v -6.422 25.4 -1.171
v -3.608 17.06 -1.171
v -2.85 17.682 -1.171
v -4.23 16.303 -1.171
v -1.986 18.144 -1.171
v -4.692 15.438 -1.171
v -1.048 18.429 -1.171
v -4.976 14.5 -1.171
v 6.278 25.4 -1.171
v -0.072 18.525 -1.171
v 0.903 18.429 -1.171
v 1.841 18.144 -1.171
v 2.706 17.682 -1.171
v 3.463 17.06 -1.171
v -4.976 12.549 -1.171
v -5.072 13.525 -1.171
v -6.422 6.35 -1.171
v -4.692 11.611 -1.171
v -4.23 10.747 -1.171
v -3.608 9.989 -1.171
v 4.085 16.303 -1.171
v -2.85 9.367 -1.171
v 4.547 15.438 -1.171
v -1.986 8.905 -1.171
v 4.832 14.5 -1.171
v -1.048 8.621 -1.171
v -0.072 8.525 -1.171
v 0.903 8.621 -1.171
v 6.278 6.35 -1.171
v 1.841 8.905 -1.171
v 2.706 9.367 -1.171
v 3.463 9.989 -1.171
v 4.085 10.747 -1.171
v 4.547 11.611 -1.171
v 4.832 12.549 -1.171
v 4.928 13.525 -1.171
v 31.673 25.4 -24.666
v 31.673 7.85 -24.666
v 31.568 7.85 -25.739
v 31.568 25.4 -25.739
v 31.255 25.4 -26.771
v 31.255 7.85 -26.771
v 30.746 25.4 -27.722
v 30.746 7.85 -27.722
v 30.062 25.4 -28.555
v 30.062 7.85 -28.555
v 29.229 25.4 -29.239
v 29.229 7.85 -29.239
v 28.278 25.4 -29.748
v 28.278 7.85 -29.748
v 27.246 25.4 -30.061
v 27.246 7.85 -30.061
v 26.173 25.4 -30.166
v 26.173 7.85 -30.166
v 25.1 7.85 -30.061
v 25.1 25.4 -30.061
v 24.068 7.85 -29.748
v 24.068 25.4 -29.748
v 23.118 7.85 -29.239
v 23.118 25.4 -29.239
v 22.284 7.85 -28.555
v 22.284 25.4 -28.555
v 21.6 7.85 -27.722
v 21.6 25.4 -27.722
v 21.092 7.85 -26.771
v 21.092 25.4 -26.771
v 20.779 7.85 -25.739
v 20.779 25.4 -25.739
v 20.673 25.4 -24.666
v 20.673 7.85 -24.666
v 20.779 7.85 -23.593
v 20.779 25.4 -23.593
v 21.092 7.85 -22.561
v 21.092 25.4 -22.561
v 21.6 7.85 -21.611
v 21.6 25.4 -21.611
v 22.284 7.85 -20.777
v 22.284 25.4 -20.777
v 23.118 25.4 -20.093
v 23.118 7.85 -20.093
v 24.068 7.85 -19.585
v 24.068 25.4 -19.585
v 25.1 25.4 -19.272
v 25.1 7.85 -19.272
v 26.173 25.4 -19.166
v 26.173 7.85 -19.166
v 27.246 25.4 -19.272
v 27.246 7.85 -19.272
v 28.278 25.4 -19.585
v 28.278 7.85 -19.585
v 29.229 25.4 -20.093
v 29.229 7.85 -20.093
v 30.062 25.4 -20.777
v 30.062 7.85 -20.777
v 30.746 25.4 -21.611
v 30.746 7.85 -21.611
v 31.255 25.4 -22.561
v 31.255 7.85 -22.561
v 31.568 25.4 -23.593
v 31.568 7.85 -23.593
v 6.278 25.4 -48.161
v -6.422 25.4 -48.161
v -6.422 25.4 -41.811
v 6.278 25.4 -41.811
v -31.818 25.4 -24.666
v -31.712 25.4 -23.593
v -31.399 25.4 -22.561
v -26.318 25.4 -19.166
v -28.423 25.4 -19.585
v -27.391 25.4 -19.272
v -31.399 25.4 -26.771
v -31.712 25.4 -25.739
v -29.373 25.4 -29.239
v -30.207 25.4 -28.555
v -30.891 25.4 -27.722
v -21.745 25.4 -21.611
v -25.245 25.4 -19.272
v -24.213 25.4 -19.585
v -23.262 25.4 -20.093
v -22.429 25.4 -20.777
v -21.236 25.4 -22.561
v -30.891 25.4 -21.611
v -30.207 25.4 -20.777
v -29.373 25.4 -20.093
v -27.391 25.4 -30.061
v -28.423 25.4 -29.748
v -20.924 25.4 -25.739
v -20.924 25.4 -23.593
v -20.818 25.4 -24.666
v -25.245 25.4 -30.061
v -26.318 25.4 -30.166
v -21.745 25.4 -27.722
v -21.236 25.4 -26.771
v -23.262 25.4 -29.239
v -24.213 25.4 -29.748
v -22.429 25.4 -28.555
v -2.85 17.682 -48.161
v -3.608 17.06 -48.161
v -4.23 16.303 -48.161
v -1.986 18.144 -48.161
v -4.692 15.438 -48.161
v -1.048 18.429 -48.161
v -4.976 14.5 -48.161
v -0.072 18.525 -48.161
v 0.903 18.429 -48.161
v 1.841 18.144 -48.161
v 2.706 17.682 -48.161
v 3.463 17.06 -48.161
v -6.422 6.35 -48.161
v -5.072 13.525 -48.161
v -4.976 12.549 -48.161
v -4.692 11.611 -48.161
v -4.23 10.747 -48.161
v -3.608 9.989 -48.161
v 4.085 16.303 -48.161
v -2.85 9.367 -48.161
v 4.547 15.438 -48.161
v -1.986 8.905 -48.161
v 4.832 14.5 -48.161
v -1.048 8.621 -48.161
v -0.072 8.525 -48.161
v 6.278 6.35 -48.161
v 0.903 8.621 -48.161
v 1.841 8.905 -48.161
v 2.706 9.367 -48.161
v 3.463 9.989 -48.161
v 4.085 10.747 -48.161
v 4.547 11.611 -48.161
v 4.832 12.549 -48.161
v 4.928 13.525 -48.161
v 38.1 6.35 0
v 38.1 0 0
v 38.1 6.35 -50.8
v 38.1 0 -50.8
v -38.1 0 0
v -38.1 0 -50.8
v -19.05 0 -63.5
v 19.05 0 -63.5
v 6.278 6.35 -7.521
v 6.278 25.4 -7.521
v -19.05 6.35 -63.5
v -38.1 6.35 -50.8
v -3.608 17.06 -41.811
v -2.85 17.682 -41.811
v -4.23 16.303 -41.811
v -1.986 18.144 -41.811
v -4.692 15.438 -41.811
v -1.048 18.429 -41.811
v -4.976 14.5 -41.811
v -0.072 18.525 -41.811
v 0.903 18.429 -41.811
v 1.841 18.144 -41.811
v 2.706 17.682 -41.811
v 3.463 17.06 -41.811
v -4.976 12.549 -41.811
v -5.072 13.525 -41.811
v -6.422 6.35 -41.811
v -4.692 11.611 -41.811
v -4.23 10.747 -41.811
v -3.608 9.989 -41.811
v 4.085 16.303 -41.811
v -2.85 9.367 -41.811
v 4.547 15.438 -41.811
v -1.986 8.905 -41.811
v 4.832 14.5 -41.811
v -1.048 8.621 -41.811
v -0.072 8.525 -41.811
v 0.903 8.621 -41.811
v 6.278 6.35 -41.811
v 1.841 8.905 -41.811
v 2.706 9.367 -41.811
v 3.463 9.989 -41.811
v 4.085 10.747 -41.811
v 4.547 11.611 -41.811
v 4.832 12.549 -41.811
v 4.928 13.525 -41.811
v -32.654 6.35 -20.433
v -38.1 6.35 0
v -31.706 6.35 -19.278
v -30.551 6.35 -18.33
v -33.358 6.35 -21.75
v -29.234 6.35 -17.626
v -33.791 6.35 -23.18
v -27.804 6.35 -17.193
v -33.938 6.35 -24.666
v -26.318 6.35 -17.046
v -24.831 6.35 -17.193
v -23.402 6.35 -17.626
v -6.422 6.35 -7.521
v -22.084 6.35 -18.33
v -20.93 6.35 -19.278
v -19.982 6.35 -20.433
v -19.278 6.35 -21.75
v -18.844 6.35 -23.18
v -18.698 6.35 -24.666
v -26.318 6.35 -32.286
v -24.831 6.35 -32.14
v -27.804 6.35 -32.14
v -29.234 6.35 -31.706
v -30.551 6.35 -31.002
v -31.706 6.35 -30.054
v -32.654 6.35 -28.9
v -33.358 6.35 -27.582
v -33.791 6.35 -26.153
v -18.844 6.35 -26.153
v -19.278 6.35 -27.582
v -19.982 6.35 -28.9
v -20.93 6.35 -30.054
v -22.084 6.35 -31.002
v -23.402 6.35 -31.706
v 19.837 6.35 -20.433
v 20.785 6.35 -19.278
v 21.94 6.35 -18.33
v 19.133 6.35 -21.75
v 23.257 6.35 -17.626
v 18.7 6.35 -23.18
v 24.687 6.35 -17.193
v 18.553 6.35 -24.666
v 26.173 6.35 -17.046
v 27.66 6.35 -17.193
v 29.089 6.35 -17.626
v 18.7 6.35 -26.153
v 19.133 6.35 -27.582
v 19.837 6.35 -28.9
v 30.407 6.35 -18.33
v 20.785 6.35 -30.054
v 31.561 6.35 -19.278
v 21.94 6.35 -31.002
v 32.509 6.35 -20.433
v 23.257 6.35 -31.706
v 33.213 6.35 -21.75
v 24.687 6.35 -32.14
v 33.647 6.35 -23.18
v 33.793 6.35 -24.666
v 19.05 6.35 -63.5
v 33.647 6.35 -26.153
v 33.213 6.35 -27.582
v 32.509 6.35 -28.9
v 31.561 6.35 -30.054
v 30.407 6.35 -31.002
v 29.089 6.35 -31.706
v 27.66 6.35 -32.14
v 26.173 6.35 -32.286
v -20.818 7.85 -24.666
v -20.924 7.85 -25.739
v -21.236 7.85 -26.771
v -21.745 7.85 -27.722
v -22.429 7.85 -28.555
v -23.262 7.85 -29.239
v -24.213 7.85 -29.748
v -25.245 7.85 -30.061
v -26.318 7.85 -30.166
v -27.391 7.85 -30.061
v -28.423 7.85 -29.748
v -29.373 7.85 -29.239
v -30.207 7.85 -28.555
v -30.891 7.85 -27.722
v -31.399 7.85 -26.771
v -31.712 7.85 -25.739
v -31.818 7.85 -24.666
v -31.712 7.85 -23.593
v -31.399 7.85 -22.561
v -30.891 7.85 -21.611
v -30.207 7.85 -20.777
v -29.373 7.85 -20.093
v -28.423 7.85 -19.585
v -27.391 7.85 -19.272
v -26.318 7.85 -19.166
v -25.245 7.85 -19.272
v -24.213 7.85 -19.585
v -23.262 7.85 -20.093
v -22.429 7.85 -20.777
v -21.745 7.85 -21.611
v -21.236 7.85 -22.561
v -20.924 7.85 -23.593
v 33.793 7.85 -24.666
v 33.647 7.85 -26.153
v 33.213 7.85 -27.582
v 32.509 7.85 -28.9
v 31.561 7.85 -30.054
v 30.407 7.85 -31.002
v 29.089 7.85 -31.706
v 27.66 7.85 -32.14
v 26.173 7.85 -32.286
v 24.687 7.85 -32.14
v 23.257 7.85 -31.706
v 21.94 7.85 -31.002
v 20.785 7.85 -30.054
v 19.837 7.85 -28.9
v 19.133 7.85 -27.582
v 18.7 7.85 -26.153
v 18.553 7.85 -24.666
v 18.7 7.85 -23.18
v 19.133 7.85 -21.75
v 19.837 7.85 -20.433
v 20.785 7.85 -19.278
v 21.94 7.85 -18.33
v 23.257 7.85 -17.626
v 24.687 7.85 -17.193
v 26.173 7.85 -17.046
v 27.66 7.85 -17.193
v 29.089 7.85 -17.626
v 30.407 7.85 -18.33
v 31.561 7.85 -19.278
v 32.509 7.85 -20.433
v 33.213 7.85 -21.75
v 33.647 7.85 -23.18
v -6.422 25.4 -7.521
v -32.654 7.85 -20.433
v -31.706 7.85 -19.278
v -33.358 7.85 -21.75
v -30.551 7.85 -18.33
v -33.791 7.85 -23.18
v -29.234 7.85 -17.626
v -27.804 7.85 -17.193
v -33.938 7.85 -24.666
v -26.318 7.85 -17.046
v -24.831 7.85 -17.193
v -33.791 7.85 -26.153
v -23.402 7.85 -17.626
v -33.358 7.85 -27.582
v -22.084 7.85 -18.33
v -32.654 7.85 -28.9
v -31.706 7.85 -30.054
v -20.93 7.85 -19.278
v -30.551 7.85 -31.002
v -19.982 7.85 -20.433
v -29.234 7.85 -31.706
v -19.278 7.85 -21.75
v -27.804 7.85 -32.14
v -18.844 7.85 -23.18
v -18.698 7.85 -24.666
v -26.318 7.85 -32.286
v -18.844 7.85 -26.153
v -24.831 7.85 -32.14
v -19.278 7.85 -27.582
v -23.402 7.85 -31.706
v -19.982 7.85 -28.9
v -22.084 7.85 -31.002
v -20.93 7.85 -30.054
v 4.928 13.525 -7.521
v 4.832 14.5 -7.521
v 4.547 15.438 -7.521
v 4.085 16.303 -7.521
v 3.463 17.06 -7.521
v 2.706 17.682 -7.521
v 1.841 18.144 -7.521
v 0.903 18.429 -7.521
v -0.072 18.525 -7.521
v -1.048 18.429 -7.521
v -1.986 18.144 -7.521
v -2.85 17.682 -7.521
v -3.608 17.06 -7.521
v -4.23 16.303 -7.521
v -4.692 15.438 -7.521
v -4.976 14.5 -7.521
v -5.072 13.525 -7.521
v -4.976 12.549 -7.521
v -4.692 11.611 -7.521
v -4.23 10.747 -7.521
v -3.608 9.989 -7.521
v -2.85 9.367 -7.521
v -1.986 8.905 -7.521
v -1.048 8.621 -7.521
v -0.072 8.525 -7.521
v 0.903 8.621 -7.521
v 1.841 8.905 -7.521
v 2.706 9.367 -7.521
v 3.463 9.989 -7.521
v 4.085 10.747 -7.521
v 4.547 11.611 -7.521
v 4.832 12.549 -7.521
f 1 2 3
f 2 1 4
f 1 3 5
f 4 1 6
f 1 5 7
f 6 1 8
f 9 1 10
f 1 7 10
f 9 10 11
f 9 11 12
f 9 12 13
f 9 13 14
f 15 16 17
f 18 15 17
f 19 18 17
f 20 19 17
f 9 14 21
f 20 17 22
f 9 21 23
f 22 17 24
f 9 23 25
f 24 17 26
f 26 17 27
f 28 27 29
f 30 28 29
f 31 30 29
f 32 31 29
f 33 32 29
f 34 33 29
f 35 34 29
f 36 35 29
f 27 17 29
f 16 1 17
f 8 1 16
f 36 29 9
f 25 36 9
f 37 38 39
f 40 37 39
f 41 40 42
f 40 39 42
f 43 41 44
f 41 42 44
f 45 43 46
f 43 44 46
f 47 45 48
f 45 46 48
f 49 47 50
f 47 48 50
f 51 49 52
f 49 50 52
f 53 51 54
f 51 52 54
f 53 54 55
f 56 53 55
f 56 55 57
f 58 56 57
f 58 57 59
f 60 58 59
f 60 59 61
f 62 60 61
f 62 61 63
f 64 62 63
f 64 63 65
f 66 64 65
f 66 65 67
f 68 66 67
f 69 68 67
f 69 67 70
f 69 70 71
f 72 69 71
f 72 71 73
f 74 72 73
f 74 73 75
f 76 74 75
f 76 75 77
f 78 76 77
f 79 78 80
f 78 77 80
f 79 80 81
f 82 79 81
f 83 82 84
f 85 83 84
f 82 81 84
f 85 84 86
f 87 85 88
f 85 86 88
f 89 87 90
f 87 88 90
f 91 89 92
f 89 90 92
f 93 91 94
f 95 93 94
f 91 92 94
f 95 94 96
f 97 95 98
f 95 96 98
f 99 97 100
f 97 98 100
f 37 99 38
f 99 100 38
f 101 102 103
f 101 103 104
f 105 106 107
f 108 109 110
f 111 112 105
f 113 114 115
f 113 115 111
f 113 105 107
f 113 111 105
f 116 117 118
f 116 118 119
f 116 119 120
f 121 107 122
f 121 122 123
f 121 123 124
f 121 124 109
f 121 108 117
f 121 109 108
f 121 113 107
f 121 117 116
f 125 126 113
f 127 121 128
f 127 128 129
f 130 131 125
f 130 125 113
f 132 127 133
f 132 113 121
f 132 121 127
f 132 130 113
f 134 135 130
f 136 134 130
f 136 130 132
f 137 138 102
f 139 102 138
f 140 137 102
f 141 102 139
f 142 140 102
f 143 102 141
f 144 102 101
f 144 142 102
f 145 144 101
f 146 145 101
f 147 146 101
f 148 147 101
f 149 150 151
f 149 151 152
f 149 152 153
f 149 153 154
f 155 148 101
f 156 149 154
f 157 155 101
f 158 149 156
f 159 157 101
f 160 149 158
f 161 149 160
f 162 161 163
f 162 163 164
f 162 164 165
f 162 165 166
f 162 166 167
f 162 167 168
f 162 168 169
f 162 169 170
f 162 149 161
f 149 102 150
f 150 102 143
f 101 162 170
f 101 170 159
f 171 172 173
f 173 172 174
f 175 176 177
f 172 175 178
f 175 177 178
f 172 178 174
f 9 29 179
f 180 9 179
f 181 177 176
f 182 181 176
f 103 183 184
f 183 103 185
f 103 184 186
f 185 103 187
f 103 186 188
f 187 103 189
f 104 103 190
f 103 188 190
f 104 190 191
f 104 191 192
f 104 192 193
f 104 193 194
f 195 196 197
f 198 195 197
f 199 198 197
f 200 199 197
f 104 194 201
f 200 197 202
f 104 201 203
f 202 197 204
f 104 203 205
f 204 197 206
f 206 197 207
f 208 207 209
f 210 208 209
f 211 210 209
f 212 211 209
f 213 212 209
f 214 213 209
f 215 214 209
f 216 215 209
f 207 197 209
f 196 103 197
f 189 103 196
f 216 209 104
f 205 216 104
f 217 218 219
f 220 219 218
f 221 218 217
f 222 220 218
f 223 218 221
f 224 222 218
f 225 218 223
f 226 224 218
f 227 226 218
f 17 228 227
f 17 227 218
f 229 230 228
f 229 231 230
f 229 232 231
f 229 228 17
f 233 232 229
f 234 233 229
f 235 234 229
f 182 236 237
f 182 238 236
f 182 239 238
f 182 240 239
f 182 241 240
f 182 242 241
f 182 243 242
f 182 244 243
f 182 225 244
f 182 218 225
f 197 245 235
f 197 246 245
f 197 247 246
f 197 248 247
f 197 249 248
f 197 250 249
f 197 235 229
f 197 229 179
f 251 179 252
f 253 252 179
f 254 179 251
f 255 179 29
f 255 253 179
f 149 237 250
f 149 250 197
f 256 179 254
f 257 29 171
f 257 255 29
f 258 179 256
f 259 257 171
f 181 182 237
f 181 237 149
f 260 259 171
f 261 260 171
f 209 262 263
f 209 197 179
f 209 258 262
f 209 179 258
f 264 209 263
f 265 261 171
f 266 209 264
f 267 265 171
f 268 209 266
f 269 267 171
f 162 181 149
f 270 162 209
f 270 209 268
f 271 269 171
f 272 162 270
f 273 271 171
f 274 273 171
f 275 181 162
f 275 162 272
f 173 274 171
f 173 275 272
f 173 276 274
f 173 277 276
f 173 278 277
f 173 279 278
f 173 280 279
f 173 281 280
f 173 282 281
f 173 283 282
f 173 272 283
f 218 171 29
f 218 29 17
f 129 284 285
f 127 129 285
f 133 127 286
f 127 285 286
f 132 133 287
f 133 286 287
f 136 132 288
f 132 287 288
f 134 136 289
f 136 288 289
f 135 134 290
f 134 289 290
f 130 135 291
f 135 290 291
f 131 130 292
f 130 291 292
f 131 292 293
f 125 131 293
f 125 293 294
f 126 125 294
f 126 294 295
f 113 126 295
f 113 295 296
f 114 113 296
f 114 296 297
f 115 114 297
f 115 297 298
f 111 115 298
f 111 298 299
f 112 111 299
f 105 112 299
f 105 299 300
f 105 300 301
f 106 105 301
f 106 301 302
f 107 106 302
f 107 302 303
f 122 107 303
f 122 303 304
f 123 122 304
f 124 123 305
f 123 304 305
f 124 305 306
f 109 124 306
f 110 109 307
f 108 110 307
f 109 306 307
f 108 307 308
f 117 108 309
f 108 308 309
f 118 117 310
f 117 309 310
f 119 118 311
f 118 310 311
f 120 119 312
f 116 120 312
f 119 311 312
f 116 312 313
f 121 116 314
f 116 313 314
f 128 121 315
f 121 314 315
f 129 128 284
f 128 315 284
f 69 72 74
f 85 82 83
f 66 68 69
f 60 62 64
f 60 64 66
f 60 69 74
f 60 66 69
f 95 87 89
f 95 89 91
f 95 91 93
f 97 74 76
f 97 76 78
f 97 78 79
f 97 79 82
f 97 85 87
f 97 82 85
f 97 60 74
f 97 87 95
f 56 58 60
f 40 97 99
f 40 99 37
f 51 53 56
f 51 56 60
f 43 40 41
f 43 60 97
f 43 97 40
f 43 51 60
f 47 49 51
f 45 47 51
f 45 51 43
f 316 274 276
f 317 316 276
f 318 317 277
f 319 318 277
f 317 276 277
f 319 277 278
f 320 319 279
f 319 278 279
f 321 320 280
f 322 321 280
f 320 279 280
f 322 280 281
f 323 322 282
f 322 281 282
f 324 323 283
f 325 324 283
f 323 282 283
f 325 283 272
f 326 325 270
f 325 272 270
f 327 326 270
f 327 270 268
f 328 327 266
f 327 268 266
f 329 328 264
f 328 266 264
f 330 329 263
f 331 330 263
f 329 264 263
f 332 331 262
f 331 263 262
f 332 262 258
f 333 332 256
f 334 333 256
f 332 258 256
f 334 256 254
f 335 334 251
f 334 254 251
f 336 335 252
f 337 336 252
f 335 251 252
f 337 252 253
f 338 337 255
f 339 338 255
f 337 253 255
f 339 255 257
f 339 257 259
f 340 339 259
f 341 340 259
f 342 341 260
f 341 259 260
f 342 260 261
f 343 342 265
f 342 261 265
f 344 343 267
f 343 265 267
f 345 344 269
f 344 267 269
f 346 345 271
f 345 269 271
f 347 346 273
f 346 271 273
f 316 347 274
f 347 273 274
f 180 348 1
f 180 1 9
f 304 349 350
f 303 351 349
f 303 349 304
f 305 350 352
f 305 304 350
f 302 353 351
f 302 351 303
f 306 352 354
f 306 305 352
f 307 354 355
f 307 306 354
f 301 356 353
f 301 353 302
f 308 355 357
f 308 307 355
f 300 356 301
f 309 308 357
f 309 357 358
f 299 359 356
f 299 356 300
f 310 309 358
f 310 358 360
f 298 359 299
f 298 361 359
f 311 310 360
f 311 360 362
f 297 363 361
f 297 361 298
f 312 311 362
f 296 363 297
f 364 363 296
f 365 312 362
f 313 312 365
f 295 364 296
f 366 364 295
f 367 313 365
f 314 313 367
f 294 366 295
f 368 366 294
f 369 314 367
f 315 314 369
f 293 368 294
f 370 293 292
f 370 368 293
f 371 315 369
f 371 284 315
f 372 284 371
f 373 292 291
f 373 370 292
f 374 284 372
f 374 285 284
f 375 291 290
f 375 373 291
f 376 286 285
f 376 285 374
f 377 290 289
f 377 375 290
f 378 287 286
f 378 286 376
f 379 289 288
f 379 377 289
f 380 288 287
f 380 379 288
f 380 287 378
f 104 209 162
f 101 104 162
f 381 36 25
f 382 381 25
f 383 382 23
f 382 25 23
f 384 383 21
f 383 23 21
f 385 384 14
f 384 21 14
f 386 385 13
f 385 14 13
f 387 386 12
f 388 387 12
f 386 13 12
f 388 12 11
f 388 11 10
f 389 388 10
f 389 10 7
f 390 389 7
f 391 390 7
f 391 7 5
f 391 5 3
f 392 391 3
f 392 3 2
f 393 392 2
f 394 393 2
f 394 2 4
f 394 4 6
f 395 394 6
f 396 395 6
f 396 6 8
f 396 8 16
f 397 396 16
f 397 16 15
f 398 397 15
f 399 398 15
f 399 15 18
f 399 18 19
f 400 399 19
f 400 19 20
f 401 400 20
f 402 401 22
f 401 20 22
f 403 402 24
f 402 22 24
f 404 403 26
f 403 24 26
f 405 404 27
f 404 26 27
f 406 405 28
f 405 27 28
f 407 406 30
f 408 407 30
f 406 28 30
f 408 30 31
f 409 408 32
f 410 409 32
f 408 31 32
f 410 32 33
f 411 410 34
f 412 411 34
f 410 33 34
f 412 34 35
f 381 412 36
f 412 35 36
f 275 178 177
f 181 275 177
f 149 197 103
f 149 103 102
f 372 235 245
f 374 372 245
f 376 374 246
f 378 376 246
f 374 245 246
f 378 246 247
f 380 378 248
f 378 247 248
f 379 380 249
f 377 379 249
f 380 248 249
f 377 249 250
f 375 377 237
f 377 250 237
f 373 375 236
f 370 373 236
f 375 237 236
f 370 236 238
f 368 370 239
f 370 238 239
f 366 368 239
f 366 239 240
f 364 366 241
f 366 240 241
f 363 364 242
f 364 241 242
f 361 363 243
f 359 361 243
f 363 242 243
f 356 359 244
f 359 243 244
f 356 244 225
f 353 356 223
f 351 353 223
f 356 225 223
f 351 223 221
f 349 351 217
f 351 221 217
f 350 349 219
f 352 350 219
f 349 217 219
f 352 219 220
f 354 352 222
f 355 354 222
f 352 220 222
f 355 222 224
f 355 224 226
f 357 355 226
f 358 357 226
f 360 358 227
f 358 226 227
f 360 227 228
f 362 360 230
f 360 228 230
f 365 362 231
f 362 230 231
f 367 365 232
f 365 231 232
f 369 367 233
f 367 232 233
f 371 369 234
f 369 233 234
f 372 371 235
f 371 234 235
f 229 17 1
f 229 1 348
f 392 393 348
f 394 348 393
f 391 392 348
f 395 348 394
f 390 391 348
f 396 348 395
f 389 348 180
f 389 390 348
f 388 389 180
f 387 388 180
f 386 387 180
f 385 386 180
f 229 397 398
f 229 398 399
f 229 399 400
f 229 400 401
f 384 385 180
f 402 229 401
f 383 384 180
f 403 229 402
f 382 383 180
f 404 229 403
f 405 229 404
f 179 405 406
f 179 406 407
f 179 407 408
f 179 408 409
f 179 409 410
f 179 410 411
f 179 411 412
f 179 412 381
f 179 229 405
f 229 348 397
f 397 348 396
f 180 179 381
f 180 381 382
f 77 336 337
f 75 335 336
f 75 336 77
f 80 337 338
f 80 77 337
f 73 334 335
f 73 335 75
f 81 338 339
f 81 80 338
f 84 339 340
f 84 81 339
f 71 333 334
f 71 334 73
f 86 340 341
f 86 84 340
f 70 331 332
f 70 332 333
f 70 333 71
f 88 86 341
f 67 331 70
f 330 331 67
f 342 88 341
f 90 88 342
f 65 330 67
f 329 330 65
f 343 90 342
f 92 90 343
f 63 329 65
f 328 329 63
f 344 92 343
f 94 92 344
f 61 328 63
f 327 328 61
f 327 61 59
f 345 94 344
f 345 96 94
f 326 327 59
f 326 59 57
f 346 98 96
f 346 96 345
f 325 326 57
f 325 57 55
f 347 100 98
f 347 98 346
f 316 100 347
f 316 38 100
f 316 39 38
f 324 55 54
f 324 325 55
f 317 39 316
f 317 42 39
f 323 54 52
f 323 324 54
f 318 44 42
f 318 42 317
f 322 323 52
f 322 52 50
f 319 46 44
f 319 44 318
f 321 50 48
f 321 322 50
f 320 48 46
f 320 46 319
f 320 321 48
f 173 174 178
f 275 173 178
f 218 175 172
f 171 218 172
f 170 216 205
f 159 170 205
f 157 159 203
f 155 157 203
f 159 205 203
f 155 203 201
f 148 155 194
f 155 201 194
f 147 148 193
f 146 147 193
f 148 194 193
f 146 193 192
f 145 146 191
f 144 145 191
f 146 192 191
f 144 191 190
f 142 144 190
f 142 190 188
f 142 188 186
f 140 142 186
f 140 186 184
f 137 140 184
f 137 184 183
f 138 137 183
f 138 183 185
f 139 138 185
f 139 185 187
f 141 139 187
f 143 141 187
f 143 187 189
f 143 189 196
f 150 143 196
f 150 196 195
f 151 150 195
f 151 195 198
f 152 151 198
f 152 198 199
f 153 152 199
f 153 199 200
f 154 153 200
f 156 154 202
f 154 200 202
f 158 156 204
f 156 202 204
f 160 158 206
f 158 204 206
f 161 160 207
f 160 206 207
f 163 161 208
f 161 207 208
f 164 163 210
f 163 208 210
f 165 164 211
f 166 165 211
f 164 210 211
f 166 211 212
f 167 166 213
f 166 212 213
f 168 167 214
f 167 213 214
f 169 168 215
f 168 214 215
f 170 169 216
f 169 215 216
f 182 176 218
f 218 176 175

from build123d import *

# Parameters (mm, degrees)
BOSS_EXTRUDE1_DEPTH = 6.35
SKETCH3_W           = 12.7
SKETCH3_H           = 6.35
BOSS_EXTRUDE2_DEPTH = 19.05
SKETCH4_R           = 5
CUT_EXTRUDE1_DEPTH  = 12.7
LPATTERN1_COUNT     = 2
LPATTERN1_PITCH     = 40.64
SKETCH5_R           = 5.5
BOSS_EXTRUDE3_DEPTH = 19.05
SKETCH10_R          = 7.62
BOSS_EXTRUDE4_DEPTH = 1.5


with BuildPart() as part:
    # Sketch2 → Boss-Extrude1 (new body)
    with BuildSketch(Plane(origin=(0, 0, 0), x_dir=(1, 0, 0), z_dir=(0, 1, 0))):
        Polygon((-38.1, 0), (38.1, 0), (38.1, 50.8), (19.05, 63.5), (-19.05, 63.5), (-38.1, 50.8), align=None)
    extrude(amount=BOSS_EXTRUDE1_DEPTH)

    # Sketch3 → Boss-Extrude2 (add)
    with BuildSketch(Plane(origin=(0, 6.35, 0), x_dir=(1, 0, 0), z_dir=(0, 1, 0))):
        with Locations((-0.072298758, 4.346211763)):
            Rectangle(SKETCH3_W, SKETCH3_H)
    boss_extrude2 = extrude(amount=BOSS_EXTRUDE2_DEPTH)

    # Sketch4 → Cut-Extrude1 (cut)
    with BuildSketch(Plane.XY.offset(-1.171211763)):
        with Locations((-0.072298758, 13.524669763)):
            Circle(SKETCH4_R)
    cut_extrude1 = extrude(amount=-CUT_EXTRUDE1_DEPTH, mode=Mode.SUBTRACT)

    # LPattern1: Boss-Extrude2, Cut-Extrude1 ×2
    with Locations(*[(0, 0, -i * LPATTERN1_PITCH) for i in range(1, LPATTERN1_COUNT)]):
        add(boss_extrude2)
        add(cut_extrude1, mode=Mode.SUBTRACT)

    # Sketch5 → Boss-Extrude3 (add)
    with BuildSketch(Plane(origin=(0, 6.35, 0), x_dir=(1, 0, 0), z_dir=(0, 1, 0))):
        with Locations((-26.317835068, 24.666211763)):
            Circle(SKETCH5_R)
        with Locations((26.173237553, 24.666211763)):
            Circle(SKETCH5_R)
    extrude(amount=BOSS_EXTRUDE3_DEPTH)

    # Sketch10 → Boss-Extrude4 (add)
    with BuildSketch(Plane(origin=(0, 6.35, 0), x_dir=(1, 0, 0), z_dir=(0, 1, 0))):
        with Locations((-26.31783504, 24.666211763)):
            Circle(SKETCH10_R)
        with Locations((26.173237524, 24.666211763)):
            Circle(SKETCH10_R)
    extrude(amount=BOSS_EXTRUDE4_DEPTH)


solid = part.part
